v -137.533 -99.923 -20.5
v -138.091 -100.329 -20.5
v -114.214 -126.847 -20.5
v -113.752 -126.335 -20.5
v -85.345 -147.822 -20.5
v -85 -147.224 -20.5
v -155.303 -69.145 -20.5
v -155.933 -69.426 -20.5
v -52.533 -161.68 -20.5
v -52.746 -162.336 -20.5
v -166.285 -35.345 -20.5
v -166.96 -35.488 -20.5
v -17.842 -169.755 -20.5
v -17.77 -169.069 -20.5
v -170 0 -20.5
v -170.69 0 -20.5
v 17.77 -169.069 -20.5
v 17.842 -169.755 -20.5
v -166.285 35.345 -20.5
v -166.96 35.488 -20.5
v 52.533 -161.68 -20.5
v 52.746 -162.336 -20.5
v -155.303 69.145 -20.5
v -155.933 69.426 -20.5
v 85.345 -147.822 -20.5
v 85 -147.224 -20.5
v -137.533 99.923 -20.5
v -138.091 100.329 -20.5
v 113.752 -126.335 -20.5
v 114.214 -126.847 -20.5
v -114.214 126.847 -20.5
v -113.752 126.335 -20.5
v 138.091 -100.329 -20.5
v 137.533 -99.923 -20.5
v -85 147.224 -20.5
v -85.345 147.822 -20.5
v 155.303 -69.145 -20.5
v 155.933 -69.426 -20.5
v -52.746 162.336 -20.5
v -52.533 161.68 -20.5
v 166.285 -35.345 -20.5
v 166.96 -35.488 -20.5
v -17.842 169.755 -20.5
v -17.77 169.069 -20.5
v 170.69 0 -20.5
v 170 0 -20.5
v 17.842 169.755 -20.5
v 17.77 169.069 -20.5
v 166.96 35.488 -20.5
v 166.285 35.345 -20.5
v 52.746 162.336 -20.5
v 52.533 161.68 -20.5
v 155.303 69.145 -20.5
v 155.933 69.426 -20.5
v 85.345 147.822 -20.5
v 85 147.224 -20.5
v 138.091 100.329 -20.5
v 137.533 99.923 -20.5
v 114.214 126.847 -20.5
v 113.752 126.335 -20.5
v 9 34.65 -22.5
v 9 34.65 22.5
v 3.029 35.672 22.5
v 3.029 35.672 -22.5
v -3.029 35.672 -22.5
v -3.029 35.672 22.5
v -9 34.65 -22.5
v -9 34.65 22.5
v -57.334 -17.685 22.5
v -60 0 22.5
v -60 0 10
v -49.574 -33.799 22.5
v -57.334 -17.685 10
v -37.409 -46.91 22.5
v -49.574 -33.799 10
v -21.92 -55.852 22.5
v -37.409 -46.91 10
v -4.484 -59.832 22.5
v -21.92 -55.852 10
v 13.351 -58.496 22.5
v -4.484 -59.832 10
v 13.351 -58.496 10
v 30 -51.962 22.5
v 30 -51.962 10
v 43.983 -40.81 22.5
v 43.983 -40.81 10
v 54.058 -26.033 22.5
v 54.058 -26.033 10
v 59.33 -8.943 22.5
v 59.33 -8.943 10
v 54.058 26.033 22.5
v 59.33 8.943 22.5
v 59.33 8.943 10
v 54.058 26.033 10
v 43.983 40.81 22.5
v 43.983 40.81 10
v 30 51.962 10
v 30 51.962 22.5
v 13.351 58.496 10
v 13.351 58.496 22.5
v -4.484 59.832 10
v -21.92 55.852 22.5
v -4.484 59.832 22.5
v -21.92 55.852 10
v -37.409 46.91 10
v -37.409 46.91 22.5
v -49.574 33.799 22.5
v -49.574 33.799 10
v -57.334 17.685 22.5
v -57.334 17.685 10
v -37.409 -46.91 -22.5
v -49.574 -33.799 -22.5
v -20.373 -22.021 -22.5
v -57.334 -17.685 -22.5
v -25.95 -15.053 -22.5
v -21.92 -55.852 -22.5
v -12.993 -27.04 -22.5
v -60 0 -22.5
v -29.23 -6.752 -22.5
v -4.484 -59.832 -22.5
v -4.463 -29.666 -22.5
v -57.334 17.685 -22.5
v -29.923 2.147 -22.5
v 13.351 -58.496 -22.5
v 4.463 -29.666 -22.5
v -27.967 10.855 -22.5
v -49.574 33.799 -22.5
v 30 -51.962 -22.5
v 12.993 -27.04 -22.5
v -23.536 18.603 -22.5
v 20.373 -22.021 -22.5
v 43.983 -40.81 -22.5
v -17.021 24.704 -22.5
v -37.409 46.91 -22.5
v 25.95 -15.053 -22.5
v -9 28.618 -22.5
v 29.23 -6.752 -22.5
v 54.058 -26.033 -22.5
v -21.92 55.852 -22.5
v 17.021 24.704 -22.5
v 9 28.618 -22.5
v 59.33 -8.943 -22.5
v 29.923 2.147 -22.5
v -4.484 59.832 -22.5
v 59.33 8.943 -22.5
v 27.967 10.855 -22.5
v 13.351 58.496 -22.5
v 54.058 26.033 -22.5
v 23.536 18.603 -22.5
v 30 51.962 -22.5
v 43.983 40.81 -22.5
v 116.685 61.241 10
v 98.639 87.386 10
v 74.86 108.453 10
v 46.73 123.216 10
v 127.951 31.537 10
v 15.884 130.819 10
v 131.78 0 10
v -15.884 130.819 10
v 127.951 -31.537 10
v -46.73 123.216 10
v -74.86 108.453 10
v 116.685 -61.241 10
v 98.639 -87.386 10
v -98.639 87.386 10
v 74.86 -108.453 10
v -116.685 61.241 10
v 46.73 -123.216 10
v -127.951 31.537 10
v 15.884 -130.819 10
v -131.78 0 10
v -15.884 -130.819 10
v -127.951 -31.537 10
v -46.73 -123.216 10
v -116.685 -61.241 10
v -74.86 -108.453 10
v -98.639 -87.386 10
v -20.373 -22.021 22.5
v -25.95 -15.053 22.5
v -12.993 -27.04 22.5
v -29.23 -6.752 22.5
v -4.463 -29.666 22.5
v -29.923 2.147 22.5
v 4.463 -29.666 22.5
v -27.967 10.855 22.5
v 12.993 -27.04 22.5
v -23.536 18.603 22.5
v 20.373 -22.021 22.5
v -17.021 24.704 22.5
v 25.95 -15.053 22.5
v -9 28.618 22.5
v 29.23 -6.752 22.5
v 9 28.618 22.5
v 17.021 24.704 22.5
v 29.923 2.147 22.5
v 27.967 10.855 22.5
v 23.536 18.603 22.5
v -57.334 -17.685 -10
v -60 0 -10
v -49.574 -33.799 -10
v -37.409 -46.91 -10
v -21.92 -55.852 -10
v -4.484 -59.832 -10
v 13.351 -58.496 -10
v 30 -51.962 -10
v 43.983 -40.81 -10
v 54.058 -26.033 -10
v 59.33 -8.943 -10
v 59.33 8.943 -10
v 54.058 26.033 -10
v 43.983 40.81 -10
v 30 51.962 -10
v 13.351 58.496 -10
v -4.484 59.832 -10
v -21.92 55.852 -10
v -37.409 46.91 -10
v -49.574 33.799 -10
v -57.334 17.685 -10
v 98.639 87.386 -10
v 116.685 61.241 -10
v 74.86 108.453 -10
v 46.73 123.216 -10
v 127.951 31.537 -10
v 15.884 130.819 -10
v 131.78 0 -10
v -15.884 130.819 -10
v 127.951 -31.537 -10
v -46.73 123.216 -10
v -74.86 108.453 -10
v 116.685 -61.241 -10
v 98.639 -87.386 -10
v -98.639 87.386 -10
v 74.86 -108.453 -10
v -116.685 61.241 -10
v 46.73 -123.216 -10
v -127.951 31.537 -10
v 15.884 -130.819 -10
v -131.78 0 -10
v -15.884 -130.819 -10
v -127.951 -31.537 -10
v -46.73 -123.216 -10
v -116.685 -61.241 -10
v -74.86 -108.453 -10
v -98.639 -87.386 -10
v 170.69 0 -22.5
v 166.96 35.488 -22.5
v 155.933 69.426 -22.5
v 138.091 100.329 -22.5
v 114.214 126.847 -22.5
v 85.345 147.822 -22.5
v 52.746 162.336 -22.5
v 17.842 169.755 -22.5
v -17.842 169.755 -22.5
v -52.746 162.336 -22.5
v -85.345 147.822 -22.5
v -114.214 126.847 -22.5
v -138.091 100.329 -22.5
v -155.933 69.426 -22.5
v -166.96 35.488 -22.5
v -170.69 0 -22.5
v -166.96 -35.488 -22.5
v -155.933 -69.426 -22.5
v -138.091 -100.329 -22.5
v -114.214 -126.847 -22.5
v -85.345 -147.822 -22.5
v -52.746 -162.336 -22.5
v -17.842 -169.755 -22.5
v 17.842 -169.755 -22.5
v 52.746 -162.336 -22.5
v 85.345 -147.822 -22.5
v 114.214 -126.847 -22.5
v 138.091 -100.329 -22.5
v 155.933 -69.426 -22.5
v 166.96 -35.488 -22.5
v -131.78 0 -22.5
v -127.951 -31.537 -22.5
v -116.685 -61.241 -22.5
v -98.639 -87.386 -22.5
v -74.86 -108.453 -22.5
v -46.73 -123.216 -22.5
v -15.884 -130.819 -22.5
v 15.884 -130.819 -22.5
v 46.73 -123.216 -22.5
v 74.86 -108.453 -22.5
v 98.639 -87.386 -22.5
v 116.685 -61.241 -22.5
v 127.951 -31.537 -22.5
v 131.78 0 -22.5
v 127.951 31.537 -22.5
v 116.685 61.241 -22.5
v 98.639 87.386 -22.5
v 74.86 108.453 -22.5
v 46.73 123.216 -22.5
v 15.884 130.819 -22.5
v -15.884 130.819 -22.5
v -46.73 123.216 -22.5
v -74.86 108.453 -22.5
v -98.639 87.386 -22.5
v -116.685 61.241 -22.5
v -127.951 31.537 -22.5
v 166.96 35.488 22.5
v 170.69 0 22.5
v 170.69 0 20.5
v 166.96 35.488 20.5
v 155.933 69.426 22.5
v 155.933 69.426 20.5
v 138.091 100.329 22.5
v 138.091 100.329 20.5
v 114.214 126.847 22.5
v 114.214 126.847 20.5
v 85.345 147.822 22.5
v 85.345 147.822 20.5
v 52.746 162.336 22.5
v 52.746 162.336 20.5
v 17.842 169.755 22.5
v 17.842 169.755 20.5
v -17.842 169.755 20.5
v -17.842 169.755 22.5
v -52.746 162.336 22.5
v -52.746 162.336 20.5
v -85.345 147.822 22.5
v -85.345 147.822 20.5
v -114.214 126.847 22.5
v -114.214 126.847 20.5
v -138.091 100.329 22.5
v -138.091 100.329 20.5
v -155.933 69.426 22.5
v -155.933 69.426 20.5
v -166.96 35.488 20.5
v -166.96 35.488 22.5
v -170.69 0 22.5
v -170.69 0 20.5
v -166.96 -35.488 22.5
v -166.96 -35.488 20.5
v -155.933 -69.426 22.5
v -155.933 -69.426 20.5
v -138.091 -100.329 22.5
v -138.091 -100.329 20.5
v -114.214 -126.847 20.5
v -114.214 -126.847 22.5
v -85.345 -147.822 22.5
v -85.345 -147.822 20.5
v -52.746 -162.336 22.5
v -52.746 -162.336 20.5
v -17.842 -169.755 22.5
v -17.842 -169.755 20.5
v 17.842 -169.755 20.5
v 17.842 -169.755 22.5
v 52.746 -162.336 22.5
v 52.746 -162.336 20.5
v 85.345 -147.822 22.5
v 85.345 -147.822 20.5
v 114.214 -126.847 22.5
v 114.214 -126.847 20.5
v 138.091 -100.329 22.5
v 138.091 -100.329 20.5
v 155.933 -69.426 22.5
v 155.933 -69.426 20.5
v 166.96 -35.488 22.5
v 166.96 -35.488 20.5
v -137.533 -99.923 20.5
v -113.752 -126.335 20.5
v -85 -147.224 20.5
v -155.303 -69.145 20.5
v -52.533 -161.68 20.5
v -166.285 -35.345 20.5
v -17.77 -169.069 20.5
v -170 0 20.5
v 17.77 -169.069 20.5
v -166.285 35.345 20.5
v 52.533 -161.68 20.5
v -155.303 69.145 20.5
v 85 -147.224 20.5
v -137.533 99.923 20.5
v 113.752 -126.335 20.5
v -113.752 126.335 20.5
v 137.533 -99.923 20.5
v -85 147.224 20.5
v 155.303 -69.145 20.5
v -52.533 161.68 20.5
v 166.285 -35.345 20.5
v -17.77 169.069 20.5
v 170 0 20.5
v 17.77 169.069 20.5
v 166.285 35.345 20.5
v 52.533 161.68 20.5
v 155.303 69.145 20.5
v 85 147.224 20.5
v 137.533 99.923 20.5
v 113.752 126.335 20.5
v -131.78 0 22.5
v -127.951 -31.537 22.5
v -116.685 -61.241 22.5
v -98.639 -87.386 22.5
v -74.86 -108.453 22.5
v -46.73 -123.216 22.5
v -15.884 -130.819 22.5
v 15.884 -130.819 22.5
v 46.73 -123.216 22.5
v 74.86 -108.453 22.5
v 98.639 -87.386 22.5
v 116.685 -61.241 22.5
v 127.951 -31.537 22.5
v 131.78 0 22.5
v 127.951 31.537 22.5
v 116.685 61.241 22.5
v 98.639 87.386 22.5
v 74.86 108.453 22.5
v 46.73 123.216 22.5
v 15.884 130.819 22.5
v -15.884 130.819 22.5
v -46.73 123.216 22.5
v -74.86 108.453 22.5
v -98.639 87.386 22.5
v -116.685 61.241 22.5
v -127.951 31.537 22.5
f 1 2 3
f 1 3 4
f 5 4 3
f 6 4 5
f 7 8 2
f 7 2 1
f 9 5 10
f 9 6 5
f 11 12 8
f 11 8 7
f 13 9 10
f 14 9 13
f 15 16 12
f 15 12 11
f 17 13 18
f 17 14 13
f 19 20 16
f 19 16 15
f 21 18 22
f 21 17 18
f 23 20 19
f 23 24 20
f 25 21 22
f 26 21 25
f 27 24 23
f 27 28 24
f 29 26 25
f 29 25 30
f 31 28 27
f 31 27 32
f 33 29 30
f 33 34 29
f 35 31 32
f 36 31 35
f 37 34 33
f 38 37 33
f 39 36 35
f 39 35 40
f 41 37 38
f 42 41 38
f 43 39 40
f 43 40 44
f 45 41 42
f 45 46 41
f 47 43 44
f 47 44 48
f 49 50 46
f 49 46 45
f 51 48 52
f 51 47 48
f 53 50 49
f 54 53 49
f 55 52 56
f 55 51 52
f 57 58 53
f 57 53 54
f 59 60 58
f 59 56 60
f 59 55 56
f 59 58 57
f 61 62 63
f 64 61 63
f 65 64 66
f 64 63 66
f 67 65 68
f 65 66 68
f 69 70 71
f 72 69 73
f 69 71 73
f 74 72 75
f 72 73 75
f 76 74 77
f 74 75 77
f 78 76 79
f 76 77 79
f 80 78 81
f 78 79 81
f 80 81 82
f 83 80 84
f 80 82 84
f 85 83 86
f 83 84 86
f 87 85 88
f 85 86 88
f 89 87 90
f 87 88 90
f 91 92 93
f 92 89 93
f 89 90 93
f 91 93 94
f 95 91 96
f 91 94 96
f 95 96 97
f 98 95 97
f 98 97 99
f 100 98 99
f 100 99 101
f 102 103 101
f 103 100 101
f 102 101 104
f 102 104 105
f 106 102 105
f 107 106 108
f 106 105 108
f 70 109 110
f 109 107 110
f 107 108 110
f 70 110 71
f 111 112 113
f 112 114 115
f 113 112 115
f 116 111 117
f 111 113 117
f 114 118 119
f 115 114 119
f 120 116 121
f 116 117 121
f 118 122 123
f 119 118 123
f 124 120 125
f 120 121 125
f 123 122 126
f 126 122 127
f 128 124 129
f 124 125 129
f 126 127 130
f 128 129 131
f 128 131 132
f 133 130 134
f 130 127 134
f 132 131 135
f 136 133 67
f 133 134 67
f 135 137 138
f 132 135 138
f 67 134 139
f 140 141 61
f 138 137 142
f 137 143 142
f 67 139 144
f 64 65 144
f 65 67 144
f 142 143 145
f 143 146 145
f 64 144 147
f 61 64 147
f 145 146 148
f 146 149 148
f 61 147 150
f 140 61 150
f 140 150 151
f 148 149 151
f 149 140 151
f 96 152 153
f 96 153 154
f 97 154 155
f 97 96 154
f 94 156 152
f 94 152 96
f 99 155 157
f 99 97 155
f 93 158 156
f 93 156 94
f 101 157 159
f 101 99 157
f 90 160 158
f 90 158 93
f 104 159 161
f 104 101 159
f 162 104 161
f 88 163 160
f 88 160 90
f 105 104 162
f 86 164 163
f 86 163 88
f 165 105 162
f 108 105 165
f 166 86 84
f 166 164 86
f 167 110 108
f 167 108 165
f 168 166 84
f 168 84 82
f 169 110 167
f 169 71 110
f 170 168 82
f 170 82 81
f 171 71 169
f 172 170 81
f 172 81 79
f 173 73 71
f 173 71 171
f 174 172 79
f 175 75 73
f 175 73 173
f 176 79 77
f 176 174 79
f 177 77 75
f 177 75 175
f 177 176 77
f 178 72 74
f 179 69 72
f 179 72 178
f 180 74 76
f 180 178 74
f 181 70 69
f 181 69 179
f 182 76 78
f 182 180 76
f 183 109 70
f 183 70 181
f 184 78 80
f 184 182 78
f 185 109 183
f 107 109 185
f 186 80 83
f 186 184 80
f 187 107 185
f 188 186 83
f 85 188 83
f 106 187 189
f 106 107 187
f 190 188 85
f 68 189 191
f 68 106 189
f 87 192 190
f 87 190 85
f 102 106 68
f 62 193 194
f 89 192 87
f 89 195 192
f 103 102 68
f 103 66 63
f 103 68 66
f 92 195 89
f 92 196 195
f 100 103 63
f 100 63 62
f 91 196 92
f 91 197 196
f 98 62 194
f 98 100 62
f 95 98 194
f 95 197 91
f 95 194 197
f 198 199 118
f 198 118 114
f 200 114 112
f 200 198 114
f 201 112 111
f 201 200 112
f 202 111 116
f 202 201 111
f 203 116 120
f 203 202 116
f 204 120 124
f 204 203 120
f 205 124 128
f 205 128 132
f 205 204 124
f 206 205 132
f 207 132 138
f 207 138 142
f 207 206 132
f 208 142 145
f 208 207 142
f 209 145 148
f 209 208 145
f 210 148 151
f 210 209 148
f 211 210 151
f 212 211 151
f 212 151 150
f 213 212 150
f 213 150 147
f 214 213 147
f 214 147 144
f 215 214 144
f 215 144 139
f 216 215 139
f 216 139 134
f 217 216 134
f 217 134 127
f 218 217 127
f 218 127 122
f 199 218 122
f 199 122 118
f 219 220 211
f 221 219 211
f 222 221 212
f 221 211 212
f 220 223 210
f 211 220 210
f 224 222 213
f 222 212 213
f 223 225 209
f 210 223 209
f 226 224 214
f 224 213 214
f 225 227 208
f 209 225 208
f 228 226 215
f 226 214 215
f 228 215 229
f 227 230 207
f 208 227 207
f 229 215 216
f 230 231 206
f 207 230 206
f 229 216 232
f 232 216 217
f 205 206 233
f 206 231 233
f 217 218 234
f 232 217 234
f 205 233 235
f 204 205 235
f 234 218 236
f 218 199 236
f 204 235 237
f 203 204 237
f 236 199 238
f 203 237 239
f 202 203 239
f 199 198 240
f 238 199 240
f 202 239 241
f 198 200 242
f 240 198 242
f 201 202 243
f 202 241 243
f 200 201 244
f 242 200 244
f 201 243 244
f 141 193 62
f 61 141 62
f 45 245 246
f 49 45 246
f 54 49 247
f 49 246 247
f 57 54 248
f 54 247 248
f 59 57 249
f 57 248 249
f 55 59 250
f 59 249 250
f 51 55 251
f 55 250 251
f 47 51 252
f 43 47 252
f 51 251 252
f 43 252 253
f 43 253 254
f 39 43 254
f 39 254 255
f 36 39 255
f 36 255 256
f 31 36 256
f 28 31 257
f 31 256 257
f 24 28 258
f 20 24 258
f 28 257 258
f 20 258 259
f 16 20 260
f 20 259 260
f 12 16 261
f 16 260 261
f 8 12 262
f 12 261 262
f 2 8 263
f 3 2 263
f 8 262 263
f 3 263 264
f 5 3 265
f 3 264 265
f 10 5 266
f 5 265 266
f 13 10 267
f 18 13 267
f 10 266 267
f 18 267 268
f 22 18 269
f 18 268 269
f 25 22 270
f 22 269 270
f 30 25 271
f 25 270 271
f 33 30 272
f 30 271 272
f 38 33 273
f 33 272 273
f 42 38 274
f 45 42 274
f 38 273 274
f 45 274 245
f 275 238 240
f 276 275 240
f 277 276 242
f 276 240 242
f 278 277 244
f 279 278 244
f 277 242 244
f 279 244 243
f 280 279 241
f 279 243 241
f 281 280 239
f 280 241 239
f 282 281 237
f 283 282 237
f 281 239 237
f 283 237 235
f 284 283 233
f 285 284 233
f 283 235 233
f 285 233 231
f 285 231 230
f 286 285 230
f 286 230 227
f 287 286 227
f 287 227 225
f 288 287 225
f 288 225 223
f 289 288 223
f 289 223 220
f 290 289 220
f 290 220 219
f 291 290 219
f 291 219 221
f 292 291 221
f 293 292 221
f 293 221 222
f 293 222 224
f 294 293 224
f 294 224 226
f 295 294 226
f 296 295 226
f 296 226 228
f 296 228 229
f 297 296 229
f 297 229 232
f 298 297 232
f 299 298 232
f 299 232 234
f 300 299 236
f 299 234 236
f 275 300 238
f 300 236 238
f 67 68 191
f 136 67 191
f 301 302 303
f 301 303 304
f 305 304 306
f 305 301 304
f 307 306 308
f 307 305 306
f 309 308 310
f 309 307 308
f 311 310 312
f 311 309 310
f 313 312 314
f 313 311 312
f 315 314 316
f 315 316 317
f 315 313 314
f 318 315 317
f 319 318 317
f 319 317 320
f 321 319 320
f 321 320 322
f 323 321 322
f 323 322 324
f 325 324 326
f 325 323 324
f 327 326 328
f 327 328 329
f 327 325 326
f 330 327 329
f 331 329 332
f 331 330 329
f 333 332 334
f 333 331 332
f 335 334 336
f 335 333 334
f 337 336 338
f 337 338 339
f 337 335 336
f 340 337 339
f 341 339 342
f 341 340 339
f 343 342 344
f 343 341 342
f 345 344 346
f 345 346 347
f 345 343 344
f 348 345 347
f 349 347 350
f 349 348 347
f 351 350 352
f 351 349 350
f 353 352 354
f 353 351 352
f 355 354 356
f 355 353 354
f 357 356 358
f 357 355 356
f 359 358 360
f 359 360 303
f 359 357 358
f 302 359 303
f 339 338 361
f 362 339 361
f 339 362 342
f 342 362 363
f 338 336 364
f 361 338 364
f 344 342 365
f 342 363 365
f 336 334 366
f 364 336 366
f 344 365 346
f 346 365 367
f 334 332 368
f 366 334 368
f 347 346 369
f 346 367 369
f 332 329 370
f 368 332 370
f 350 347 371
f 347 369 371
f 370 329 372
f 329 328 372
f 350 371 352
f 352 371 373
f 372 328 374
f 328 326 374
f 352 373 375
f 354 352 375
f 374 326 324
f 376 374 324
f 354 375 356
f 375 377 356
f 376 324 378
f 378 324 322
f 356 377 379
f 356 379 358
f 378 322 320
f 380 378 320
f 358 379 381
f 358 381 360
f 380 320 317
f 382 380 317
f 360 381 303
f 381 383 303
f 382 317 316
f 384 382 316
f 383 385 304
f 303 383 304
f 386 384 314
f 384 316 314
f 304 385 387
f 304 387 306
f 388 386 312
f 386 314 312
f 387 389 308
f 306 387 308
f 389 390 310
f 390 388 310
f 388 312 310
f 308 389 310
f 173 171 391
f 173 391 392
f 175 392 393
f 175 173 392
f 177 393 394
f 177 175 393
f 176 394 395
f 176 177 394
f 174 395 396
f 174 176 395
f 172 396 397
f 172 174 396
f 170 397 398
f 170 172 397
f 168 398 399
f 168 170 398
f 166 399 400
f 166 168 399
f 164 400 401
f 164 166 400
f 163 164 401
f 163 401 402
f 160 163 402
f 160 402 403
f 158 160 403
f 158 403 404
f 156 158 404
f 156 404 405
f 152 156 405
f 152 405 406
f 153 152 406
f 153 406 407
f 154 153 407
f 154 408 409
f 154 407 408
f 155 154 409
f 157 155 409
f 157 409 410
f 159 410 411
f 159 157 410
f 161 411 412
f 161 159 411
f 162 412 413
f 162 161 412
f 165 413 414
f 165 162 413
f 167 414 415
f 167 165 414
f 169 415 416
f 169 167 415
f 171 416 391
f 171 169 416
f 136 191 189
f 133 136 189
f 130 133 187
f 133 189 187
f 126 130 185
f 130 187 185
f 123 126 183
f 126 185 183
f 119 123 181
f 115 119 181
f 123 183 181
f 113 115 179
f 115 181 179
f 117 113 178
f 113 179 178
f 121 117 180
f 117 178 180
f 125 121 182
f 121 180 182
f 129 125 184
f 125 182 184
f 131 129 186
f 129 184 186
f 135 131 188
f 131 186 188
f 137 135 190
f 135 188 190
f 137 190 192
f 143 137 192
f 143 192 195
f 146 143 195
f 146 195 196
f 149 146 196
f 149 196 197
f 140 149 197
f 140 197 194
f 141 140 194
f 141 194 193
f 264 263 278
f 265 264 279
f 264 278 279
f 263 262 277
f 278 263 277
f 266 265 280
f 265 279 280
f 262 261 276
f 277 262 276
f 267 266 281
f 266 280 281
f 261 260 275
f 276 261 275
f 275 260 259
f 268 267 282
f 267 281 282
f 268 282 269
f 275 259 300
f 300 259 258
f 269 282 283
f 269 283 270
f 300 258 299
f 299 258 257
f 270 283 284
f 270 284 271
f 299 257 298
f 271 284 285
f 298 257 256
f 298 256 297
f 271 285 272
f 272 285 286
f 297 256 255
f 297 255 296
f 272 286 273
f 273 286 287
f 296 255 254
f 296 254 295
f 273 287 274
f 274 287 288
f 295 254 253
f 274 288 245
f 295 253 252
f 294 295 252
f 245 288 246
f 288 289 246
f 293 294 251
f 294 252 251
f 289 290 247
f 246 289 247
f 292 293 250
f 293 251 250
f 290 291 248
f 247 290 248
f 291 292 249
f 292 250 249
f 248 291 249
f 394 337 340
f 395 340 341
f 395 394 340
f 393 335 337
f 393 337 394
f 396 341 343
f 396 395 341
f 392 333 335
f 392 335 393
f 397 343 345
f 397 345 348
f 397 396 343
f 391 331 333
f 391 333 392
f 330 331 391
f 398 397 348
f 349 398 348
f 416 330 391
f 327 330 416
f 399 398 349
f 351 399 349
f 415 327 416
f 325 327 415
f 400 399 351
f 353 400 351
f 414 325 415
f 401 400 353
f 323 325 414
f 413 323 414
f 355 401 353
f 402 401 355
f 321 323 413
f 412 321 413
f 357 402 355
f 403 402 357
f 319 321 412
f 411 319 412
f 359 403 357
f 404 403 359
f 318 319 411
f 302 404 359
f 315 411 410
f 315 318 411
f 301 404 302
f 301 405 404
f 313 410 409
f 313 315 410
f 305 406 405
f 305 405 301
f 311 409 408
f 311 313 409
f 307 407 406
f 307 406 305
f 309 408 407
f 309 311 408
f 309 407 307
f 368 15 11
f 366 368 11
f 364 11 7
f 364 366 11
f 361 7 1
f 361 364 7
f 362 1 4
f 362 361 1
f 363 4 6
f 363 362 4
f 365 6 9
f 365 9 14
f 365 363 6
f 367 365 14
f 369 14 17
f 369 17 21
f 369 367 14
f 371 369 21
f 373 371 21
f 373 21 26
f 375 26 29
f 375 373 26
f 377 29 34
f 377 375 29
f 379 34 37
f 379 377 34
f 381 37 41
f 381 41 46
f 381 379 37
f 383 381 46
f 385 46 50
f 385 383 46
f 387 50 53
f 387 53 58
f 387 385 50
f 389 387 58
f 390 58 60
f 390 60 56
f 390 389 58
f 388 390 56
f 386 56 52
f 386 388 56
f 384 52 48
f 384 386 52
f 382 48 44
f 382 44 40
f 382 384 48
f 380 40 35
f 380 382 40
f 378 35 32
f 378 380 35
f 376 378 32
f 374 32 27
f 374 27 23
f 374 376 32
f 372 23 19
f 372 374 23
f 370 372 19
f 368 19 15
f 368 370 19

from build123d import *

# Parameters (mm, degrees)
SKETCH1_R           = 170
BOSS_EXTRUDE1_DEPTH = 22.5
SKETCH2_R           = 170.69
BOSS_EXTRUDE2_DEPTH = 2
CUT_EXTRUDE3_START  = 10
SKETCH5_R           = 131.78
SKETCH5_R_2         = 60
CUT_EXTRUDE3_DEPTH  = 233.438450333
SKETCH6_R           = 30
CUT_EXTRUDE4_DEPTH  = 246.550712074
CUT_EXTRUDE5_DEPTH  = 246.550712074


with BuildPart() as part:
    # Sketch1 → Boss-Extrude1 (new, symmetric)
    with BuildSketch(Plane.XY):
        with Locations(Location((0, 0, 0), (0, 0, 180))):
            Circle(SKETCH1_R)
    extrude(amount=BOSS_EXTRUDE1_DEPTH, both=True)

    # Sketch2 → Boss-Extrude2 (add)
    with BuildSketch(Plane.XY.offset(22.5)):
        Circle(SKETCH2_R)
    boss_extrude2 = extrude(amount=-BOSS_EXTRUDE2_DEPTH)

    # Mirror1: Boss-Extrude2 across plane
    add(boss_extrude2.mirror(Plane.XY))

    # Sketch5 → Cut-Extrude3 (cut, through all)
    with BuildSketch(Plane.XY.offset(CUT_EXTRUDE3_START)):
        with Locations(Location((0, 0, 0), (0, 0, 180))):
            Circle(SKETCH5_R)
        with Locations(Location((0, 0, 0), (0, 0, 180))):
            Circle(SKETCH5_R_2, mode=Mode.SUBTRACT)
    cut_extrude3 = extrude(amount=CUT_EXTRUDE3_DEPTH, mode=Mode.SUBTRACT)

    # Mirror2: Cut-Extrude3 across plane
    add(cut_extrude3.mirror(Plane.XY), mode=Mode.SUBTRACT)

    # Sketch6 → Cut-Extrude4 (cut, through all)
    with BuildSketch(Plane.XY.offset(22.5)):
        Circle(SKETCH6_R)
    extrude(amount=-CUT_EXTRUDE4_DEPTH, mode=Mode.SUBTRACT)

    # Sketch7 → Cut-Extrude5 (cut, through all)
    with BuildSketch(Plane.XY.offset(22.5)):
        with BuildLine():
            Line((9, 20.2728873), (9, 34.650252524))
            ThreePointArc((9, 34.650252524), (0, 35.8), (-9, 34.650252524))
            Line((-9, 34.650252524), (-9, 20.2728873))
            Line((-9, 20.2728873), (9, 20.2728873))
        make_face()
    extrude(amount=-CUT_EXTRUDE5_DEPTH, mode=Mode.SUBTRACT)


solid = part.part
